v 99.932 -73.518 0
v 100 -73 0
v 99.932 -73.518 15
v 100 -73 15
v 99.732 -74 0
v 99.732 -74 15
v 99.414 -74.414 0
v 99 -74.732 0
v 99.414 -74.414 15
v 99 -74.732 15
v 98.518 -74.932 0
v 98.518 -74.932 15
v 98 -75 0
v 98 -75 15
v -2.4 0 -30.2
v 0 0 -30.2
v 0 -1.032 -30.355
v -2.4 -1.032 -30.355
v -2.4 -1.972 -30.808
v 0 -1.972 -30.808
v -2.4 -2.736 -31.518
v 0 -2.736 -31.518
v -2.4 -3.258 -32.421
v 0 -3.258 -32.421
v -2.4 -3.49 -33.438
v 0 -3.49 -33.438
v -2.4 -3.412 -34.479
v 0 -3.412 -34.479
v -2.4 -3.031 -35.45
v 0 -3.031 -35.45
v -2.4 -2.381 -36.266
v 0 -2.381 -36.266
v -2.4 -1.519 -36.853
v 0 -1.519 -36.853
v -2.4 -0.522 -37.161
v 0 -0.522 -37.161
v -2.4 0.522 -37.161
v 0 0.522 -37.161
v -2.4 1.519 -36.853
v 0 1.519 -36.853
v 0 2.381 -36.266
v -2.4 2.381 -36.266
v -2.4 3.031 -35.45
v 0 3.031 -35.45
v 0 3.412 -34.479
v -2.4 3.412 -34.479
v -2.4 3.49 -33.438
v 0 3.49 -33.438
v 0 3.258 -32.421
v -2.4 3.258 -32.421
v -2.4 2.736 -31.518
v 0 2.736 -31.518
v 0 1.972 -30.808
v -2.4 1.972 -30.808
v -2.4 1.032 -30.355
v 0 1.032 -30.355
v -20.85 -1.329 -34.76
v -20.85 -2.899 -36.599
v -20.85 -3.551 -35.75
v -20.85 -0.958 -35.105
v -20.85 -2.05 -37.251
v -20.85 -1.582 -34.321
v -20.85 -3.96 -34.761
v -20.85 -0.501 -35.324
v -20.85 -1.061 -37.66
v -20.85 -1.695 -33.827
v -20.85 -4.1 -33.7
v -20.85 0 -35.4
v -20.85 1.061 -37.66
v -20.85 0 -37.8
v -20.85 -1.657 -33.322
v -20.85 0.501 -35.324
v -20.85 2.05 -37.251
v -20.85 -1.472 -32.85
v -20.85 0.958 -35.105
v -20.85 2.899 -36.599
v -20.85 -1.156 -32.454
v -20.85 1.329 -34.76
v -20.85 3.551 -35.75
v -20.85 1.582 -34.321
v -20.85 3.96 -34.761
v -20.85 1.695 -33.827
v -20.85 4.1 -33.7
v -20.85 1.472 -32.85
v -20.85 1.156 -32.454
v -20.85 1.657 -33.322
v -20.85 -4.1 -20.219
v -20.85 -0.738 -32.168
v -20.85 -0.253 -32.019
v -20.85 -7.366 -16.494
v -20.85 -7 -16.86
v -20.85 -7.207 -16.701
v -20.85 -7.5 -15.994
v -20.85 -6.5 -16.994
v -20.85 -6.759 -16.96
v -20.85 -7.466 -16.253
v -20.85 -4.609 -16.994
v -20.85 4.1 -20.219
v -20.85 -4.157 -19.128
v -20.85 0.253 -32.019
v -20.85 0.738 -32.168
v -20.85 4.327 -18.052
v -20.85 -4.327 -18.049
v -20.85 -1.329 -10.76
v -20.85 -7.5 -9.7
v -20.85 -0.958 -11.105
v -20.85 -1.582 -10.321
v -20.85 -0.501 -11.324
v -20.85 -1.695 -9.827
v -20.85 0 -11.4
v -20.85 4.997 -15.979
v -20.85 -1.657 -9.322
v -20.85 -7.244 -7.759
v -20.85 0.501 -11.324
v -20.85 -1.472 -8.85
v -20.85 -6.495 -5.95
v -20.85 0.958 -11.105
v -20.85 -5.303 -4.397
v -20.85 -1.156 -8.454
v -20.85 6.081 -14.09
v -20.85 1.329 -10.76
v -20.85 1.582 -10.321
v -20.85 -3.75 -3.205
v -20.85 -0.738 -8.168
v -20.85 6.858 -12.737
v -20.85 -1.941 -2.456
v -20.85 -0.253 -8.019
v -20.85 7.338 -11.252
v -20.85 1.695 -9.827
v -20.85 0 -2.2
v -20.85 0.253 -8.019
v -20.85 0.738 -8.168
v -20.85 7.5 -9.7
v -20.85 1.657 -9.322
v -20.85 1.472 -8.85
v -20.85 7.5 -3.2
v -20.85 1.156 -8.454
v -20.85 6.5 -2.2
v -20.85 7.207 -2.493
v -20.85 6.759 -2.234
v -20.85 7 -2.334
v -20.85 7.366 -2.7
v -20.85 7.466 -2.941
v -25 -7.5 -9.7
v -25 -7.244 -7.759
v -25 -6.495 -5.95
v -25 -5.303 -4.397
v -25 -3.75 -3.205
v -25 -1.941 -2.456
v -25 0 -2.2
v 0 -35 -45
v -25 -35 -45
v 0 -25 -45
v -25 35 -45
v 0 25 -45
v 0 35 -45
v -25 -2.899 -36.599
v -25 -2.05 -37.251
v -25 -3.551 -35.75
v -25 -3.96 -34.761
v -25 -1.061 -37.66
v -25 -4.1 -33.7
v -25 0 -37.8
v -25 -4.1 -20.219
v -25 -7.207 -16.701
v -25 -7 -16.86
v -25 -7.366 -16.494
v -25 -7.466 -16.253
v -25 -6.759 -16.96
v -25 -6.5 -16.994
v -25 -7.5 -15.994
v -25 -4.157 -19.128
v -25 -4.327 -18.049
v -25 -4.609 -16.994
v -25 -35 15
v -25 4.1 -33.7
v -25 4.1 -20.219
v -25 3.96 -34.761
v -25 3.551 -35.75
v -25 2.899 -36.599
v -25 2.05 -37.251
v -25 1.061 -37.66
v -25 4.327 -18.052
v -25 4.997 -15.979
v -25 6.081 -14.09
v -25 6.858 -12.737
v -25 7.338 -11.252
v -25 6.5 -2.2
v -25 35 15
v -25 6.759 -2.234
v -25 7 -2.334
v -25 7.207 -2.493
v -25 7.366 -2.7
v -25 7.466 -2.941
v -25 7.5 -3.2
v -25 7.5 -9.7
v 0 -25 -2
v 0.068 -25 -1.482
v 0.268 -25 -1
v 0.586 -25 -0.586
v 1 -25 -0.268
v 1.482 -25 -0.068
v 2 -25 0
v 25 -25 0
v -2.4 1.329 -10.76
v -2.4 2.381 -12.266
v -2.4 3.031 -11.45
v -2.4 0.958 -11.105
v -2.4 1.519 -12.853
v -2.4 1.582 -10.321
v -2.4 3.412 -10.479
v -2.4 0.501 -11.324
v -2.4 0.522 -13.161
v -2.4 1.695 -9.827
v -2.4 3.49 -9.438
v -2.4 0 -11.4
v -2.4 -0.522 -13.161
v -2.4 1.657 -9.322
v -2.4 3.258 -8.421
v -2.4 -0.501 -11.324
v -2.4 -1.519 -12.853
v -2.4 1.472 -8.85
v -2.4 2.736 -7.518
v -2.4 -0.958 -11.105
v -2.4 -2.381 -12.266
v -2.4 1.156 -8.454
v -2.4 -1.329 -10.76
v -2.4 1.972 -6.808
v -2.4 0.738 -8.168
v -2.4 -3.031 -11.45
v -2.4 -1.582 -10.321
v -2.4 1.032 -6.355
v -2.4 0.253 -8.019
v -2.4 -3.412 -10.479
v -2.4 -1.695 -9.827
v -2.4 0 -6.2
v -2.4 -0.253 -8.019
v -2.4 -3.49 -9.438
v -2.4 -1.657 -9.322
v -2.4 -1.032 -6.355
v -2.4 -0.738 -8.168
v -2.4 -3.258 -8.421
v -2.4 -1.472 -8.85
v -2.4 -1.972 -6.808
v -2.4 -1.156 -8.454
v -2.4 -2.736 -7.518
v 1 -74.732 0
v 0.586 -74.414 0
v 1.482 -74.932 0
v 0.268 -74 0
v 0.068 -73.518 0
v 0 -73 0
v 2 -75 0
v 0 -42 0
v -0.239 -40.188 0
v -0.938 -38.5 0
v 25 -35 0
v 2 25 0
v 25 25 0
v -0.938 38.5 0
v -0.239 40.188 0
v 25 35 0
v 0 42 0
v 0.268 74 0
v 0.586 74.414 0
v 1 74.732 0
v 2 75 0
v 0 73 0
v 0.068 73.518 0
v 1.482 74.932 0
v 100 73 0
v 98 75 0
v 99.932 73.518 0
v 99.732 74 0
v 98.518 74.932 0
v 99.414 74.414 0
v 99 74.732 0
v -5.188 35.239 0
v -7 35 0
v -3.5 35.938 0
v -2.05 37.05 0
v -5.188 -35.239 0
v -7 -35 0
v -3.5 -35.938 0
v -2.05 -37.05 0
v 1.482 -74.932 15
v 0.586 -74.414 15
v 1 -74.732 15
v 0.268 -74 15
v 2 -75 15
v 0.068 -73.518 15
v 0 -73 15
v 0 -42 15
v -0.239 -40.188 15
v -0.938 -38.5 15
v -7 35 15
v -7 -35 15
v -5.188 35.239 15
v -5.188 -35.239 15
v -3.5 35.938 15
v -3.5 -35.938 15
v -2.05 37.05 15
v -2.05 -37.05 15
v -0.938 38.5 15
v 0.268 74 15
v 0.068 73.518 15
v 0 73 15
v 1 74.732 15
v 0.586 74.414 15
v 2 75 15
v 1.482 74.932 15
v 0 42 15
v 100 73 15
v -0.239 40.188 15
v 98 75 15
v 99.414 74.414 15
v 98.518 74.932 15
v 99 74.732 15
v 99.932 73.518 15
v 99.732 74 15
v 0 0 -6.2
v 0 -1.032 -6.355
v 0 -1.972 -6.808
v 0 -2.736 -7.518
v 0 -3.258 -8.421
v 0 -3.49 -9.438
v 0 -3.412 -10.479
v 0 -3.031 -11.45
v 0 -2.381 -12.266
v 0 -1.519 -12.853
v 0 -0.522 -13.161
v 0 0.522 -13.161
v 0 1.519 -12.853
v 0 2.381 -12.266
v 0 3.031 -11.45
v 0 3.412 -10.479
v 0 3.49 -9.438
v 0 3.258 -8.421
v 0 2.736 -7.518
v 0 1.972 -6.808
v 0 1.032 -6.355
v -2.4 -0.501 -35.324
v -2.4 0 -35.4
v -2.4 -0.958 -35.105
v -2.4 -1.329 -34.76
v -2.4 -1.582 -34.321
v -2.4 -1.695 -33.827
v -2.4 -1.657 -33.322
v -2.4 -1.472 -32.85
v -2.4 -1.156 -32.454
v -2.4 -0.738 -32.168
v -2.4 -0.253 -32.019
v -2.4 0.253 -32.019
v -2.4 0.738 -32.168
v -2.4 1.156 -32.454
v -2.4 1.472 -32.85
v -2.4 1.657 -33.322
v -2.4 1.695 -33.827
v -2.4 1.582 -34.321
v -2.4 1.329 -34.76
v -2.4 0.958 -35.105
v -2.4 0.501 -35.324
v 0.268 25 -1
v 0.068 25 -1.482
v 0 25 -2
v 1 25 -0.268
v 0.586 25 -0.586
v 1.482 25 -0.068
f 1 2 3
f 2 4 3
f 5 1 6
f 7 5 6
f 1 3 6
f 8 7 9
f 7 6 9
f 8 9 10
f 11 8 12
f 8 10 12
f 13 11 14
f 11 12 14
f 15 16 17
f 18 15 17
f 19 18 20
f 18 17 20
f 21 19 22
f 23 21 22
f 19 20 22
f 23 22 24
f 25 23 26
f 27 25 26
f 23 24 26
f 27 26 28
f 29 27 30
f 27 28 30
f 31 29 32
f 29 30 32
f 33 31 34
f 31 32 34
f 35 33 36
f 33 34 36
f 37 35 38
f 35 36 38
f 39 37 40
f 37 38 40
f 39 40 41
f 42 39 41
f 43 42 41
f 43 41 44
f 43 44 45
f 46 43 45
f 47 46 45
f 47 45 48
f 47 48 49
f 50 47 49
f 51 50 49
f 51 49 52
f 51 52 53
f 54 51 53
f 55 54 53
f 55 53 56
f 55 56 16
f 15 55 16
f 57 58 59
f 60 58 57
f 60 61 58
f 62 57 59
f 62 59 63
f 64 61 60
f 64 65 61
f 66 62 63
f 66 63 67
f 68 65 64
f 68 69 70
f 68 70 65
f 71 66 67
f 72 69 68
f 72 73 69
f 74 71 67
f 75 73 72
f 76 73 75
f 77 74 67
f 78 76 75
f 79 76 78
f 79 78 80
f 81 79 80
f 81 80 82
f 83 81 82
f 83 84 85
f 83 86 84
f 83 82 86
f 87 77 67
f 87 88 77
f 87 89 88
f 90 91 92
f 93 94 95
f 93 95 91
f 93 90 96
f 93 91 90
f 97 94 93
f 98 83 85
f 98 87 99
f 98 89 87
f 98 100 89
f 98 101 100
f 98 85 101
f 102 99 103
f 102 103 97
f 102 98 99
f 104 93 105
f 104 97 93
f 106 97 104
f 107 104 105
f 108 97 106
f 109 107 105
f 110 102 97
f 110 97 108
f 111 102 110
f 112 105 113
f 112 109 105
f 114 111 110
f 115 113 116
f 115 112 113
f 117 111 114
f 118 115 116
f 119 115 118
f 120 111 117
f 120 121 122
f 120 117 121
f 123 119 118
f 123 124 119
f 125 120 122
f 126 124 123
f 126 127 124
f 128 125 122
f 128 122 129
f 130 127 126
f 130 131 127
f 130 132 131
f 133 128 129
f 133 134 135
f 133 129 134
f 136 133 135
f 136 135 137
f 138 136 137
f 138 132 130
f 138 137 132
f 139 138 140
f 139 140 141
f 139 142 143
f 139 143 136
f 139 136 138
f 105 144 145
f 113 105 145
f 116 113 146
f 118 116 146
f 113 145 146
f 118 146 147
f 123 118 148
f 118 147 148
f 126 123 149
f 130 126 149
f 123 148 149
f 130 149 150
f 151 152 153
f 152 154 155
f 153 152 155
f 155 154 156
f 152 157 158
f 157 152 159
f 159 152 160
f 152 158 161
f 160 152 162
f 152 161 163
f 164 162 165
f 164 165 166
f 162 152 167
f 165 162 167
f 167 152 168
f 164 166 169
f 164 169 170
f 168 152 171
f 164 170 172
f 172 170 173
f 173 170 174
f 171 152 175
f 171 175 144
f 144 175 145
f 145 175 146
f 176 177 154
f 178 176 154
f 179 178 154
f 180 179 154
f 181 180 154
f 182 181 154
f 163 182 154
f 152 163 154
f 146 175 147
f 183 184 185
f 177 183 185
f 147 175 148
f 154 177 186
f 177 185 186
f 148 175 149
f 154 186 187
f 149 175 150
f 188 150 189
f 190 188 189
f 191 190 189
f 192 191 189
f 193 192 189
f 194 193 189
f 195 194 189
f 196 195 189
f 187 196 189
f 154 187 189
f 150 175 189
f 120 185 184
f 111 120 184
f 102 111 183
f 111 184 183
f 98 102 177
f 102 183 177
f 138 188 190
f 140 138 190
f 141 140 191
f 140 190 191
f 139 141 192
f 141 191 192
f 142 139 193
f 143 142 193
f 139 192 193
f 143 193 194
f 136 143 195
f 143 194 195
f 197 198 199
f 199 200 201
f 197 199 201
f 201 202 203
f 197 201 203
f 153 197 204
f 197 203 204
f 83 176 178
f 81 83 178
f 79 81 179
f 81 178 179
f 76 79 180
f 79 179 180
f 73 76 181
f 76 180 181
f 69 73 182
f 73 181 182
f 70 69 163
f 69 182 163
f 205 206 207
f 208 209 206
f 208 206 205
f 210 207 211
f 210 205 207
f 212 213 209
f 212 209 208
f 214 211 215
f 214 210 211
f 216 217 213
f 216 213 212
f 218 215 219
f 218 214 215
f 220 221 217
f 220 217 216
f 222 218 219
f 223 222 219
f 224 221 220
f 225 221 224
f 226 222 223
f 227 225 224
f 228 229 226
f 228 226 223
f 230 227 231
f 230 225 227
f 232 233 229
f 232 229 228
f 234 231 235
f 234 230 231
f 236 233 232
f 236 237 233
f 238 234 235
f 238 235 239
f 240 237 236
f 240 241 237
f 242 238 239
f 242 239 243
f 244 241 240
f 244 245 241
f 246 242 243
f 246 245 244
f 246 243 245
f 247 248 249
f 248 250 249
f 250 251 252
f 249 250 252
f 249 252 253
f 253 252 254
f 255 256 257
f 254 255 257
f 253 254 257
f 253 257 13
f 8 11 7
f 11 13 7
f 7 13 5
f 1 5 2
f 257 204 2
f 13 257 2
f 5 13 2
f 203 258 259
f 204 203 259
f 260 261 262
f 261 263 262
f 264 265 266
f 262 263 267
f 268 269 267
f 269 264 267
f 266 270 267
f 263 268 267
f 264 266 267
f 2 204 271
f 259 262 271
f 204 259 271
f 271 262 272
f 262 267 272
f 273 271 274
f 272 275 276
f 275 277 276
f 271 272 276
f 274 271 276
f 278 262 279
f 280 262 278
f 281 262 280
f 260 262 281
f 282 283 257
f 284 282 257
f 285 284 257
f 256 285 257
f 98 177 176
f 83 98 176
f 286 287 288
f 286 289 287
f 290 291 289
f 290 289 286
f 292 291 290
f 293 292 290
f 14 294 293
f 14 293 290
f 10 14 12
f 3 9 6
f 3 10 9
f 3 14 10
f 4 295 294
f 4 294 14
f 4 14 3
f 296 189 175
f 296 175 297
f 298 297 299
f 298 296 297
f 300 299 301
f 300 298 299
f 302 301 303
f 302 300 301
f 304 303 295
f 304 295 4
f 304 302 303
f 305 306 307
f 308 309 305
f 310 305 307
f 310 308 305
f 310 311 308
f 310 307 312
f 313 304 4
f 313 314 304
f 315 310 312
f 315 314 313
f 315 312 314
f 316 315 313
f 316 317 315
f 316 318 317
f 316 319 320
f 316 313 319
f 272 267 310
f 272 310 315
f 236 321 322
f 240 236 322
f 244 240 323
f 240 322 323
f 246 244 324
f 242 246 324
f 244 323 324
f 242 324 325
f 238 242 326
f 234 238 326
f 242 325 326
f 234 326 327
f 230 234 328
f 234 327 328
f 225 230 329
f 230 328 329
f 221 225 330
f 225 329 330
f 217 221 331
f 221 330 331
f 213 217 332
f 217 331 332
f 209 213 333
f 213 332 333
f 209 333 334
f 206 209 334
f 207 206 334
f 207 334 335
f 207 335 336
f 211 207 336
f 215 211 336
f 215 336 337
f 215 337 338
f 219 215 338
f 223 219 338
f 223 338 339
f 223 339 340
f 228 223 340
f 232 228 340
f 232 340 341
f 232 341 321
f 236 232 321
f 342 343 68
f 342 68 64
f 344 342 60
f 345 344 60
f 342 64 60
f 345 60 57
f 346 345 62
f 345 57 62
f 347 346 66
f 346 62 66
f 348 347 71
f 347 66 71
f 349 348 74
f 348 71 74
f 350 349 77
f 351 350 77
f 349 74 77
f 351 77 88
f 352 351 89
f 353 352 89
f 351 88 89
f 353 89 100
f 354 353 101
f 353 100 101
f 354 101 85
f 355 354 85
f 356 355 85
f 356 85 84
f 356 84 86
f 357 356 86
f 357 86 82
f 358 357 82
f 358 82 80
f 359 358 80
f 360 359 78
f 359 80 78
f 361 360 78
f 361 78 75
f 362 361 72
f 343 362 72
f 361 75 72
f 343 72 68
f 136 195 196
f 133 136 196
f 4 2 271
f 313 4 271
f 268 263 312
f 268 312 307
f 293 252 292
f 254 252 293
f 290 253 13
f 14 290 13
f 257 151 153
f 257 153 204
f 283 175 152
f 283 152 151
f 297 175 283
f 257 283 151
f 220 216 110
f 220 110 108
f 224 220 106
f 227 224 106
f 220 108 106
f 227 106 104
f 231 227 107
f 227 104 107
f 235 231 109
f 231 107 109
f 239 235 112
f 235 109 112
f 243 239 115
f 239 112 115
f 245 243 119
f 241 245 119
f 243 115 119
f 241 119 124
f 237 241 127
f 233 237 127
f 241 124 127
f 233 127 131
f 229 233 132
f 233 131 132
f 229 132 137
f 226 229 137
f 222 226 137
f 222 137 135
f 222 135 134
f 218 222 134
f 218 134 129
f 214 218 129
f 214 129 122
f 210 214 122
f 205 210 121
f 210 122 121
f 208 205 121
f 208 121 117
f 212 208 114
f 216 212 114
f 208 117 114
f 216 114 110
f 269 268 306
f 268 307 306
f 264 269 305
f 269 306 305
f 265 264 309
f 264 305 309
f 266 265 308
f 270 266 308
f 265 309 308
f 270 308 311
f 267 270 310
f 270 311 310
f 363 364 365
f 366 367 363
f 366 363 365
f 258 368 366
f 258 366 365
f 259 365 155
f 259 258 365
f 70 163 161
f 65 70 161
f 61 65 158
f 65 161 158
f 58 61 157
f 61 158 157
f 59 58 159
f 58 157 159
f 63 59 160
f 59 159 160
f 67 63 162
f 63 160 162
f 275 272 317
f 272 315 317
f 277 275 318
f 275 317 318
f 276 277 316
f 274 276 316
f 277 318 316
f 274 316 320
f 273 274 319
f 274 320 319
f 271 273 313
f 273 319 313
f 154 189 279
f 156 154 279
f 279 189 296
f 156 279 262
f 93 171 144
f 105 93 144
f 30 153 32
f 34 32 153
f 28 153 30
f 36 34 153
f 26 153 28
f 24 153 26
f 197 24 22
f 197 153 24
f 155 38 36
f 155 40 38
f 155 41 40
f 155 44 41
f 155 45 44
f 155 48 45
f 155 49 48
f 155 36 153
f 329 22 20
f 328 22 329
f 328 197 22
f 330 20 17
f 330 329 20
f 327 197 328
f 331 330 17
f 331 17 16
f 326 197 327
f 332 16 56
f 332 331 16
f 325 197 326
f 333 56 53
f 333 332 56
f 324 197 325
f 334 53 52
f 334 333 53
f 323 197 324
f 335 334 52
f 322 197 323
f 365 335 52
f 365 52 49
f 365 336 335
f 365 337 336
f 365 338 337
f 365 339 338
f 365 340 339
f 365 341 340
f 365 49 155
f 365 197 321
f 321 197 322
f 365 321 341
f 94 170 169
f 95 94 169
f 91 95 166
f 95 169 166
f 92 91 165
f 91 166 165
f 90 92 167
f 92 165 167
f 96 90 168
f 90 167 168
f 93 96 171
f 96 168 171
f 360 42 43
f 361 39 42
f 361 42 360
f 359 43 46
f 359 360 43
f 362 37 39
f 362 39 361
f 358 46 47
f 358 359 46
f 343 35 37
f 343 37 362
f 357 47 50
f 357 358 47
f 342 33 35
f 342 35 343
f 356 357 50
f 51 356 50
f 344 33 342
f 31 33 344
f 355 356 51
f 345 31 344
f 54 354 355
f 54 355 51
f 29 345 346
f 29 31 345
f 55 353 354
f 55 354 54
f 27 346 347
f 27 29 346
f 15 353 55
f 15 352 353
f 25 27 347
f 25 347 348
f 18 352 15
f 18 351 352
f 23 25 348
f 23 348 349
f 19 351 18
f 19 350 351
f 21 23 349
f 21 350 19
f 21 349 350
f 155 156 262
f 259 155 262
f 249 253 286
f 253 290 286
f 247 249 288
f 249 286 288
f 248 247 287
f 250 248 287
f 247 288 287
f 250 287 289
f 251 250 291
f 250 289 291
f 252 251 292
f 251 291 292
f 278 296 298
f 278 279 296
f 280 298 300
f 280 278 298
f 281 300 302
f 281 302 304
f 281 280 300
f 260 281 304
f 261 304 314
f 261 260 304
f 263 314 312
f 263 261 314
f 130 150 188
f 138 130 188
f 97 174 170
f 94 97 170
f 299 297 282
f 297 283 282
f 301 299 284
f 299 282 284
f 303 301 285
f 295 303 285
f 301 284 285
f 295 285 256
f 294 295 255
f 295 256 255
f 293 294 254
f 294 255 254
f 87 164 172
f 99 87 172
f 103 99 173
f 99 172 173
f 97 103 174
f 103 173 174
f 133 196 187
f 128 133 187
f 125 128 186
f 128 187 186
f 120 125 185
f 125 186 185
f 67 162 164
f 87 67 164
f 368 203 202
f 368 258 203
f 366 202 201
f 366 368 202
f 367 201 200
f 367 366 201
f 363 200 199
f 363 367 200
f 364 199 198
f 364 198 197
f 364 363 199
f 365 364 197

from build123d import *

# Parameters (mm, degrees)
ESQUISSE1_W                                        = 100
ESQUISSE1_H                                        = 150
BOSS_EXTRU_1_DEPTH                                 = 15
ESQUISSE2_W                                        = 25
ESQUISSE2_H                                        = 70
BOSS_EXTRU_2_DEPTH                                 = 60
ENL_V_MAT_EXTRU_1_DEPTH                            = 4.15
CHAMBRAGE_POUR_VIS_T_TE_RONDE_BOMB_E_M_D           = 3.4
CHAMBRAGE_POUR_VIS_T_TE_RONDE_BOMB_E_M_CBORE_D     = 7
CHAMBRAGE_POUR_VIS_T_TE_RONDE_BOMB_E_M_CBORE_DEPTH = 2.4
BOSS_EXTRU_3_DEPTH                                 = 10
CONG_1_R                                           = 7
CONG_2_R                                           = 2


with BuildPart() as part:
    # Esquisse1 → Boss.-Extru.1 (new body)
    with BuildSketch(Plane.XY):
        with Locations((50, 0)):
            Rectangle(ESQUISSE1_W, ESQUISSE1_H)
    extrude(amount=BOSS_EXTRU_1_DEPTH)

    # Esquisse2 → Boss.-Extru.2 (add)
    with BuildSketch(Plane.XY.offset(15)):
        with Locations((-12.5, 0)):
            Rectangle(ESQUISSE2_W, ESQUISSE2_H)
    extrude(amount=-BOSS_EXTRU_2_DEPTH)

    # Esquisse4 → Enlèv. mat.-Extru.1 (cut)
    with BuildSketch(Plane.ZY.offset(25)):
        with BuildLine():
            Line((-2.2, 0), (-2.2, 6.5))
            ThreePointArc((-2.2, 6.5), (-2.492893219, 7.207106781), (-3.2, 7.5))
            Line((-3.2, 7.5), (-9.7, 7.5))
            ThreePointArc((-9.7, 7.5), (-12.00671757, 7.13645949), (-14.089812398, 6.081081081))
            ThreePointArc((-14.089812398, 6.081081081), (-16.998209557, 4.607571798), (-20.218826659, 4.1))
            Line((-20.218826659, 4.1), (-33.7, 4.1))
            ThreePointArc((-33.7, 4.1), (-36.599137803, 2.899137803), (-37.8, 0))
            ThreePointArc((-37.8, 0), (-36.599137803, -2.899137803), (-33.7, -4.1))
            Line((-33.7, -4.1), (-20.218826659, -4.1))
            ThreePointArc((-20.218826659, -4.1), (-18.58641381, -4.22802272), (-16.993916418, -4.60896049))
            Line((-16.993916418, -4.60896049), (-16.993916418, -6.5))
            ThreePointArc((-16.993916418, -6.5), (-16.701023199, -7.207106781), (-15.993916418, -7.5))
            Line((-15.993916418, -7.5), (-9.7, -7.5))
            ThreePointArc((-9.7, -7.5), (-4.396699141, -5.303300859), (-2.2, 0))
        make_face()
    extrude(amount=-ENL_V_MAT_EXTRU_1_DEPTH, mode=Mode.SUBTRACT)

    # Chambrage pour vis à tête ronde bombée M32 (through all)
    with Locations(Plane(origin=(0, 0, -33.7), x_dir=(0, 0, 1), z_dir=(1, 0, 0))):
        with Locations((0, 0), (24, 0)):
            CounterBoreHole(CHAMBRAGE_POUR_VIS_T_TE_RONDE_BOMB_E_M_D / 2, CHAMBRAGE_POUR_VIS_T_TE_RONDE_BOMB_E_M_CBORE_D / 2, CHAMBRAGE_POUR_VIS_T_TE_RONDE_BOMB_E_M_CBORE_DEPTH)

    # Esquisse10 → Boss.-Extru.3 (add)
    with BuildSketch(Plane.XZ.offset(35)):
        Polygon((0, -45), (25, 0), (0, 0), align=None)
    boss_extru_3 = extrude(amount=-BOSS_EXTRU_3_DEPTH)

    # Symétrie1: Boss.-Extru.3 across plane
    add(boss_extru_3.mirror(Plane.ZX))

    # Congé1
    cong_1_edges = [part.edges().sort_by_distance(p)[0] for p in [
        (0, 35, 7.5),
        (0, -35, 7.5),
    ]]
    fillet(cong_1_edges, radius=CONG_1_R)

    # Congé2
    cong_2_edges = [part.edges().sort_by_distance(p)[0] for p in [
        (0, 0, 0),
        (100, -75, 7.5),
        (100, 75, 7.5),
        (0, -75, 7.5),
        (0, 75, 7.5),
    ]]
    fillet(cong_2_edges, radius=CONG_2_R)


solid = part.part
